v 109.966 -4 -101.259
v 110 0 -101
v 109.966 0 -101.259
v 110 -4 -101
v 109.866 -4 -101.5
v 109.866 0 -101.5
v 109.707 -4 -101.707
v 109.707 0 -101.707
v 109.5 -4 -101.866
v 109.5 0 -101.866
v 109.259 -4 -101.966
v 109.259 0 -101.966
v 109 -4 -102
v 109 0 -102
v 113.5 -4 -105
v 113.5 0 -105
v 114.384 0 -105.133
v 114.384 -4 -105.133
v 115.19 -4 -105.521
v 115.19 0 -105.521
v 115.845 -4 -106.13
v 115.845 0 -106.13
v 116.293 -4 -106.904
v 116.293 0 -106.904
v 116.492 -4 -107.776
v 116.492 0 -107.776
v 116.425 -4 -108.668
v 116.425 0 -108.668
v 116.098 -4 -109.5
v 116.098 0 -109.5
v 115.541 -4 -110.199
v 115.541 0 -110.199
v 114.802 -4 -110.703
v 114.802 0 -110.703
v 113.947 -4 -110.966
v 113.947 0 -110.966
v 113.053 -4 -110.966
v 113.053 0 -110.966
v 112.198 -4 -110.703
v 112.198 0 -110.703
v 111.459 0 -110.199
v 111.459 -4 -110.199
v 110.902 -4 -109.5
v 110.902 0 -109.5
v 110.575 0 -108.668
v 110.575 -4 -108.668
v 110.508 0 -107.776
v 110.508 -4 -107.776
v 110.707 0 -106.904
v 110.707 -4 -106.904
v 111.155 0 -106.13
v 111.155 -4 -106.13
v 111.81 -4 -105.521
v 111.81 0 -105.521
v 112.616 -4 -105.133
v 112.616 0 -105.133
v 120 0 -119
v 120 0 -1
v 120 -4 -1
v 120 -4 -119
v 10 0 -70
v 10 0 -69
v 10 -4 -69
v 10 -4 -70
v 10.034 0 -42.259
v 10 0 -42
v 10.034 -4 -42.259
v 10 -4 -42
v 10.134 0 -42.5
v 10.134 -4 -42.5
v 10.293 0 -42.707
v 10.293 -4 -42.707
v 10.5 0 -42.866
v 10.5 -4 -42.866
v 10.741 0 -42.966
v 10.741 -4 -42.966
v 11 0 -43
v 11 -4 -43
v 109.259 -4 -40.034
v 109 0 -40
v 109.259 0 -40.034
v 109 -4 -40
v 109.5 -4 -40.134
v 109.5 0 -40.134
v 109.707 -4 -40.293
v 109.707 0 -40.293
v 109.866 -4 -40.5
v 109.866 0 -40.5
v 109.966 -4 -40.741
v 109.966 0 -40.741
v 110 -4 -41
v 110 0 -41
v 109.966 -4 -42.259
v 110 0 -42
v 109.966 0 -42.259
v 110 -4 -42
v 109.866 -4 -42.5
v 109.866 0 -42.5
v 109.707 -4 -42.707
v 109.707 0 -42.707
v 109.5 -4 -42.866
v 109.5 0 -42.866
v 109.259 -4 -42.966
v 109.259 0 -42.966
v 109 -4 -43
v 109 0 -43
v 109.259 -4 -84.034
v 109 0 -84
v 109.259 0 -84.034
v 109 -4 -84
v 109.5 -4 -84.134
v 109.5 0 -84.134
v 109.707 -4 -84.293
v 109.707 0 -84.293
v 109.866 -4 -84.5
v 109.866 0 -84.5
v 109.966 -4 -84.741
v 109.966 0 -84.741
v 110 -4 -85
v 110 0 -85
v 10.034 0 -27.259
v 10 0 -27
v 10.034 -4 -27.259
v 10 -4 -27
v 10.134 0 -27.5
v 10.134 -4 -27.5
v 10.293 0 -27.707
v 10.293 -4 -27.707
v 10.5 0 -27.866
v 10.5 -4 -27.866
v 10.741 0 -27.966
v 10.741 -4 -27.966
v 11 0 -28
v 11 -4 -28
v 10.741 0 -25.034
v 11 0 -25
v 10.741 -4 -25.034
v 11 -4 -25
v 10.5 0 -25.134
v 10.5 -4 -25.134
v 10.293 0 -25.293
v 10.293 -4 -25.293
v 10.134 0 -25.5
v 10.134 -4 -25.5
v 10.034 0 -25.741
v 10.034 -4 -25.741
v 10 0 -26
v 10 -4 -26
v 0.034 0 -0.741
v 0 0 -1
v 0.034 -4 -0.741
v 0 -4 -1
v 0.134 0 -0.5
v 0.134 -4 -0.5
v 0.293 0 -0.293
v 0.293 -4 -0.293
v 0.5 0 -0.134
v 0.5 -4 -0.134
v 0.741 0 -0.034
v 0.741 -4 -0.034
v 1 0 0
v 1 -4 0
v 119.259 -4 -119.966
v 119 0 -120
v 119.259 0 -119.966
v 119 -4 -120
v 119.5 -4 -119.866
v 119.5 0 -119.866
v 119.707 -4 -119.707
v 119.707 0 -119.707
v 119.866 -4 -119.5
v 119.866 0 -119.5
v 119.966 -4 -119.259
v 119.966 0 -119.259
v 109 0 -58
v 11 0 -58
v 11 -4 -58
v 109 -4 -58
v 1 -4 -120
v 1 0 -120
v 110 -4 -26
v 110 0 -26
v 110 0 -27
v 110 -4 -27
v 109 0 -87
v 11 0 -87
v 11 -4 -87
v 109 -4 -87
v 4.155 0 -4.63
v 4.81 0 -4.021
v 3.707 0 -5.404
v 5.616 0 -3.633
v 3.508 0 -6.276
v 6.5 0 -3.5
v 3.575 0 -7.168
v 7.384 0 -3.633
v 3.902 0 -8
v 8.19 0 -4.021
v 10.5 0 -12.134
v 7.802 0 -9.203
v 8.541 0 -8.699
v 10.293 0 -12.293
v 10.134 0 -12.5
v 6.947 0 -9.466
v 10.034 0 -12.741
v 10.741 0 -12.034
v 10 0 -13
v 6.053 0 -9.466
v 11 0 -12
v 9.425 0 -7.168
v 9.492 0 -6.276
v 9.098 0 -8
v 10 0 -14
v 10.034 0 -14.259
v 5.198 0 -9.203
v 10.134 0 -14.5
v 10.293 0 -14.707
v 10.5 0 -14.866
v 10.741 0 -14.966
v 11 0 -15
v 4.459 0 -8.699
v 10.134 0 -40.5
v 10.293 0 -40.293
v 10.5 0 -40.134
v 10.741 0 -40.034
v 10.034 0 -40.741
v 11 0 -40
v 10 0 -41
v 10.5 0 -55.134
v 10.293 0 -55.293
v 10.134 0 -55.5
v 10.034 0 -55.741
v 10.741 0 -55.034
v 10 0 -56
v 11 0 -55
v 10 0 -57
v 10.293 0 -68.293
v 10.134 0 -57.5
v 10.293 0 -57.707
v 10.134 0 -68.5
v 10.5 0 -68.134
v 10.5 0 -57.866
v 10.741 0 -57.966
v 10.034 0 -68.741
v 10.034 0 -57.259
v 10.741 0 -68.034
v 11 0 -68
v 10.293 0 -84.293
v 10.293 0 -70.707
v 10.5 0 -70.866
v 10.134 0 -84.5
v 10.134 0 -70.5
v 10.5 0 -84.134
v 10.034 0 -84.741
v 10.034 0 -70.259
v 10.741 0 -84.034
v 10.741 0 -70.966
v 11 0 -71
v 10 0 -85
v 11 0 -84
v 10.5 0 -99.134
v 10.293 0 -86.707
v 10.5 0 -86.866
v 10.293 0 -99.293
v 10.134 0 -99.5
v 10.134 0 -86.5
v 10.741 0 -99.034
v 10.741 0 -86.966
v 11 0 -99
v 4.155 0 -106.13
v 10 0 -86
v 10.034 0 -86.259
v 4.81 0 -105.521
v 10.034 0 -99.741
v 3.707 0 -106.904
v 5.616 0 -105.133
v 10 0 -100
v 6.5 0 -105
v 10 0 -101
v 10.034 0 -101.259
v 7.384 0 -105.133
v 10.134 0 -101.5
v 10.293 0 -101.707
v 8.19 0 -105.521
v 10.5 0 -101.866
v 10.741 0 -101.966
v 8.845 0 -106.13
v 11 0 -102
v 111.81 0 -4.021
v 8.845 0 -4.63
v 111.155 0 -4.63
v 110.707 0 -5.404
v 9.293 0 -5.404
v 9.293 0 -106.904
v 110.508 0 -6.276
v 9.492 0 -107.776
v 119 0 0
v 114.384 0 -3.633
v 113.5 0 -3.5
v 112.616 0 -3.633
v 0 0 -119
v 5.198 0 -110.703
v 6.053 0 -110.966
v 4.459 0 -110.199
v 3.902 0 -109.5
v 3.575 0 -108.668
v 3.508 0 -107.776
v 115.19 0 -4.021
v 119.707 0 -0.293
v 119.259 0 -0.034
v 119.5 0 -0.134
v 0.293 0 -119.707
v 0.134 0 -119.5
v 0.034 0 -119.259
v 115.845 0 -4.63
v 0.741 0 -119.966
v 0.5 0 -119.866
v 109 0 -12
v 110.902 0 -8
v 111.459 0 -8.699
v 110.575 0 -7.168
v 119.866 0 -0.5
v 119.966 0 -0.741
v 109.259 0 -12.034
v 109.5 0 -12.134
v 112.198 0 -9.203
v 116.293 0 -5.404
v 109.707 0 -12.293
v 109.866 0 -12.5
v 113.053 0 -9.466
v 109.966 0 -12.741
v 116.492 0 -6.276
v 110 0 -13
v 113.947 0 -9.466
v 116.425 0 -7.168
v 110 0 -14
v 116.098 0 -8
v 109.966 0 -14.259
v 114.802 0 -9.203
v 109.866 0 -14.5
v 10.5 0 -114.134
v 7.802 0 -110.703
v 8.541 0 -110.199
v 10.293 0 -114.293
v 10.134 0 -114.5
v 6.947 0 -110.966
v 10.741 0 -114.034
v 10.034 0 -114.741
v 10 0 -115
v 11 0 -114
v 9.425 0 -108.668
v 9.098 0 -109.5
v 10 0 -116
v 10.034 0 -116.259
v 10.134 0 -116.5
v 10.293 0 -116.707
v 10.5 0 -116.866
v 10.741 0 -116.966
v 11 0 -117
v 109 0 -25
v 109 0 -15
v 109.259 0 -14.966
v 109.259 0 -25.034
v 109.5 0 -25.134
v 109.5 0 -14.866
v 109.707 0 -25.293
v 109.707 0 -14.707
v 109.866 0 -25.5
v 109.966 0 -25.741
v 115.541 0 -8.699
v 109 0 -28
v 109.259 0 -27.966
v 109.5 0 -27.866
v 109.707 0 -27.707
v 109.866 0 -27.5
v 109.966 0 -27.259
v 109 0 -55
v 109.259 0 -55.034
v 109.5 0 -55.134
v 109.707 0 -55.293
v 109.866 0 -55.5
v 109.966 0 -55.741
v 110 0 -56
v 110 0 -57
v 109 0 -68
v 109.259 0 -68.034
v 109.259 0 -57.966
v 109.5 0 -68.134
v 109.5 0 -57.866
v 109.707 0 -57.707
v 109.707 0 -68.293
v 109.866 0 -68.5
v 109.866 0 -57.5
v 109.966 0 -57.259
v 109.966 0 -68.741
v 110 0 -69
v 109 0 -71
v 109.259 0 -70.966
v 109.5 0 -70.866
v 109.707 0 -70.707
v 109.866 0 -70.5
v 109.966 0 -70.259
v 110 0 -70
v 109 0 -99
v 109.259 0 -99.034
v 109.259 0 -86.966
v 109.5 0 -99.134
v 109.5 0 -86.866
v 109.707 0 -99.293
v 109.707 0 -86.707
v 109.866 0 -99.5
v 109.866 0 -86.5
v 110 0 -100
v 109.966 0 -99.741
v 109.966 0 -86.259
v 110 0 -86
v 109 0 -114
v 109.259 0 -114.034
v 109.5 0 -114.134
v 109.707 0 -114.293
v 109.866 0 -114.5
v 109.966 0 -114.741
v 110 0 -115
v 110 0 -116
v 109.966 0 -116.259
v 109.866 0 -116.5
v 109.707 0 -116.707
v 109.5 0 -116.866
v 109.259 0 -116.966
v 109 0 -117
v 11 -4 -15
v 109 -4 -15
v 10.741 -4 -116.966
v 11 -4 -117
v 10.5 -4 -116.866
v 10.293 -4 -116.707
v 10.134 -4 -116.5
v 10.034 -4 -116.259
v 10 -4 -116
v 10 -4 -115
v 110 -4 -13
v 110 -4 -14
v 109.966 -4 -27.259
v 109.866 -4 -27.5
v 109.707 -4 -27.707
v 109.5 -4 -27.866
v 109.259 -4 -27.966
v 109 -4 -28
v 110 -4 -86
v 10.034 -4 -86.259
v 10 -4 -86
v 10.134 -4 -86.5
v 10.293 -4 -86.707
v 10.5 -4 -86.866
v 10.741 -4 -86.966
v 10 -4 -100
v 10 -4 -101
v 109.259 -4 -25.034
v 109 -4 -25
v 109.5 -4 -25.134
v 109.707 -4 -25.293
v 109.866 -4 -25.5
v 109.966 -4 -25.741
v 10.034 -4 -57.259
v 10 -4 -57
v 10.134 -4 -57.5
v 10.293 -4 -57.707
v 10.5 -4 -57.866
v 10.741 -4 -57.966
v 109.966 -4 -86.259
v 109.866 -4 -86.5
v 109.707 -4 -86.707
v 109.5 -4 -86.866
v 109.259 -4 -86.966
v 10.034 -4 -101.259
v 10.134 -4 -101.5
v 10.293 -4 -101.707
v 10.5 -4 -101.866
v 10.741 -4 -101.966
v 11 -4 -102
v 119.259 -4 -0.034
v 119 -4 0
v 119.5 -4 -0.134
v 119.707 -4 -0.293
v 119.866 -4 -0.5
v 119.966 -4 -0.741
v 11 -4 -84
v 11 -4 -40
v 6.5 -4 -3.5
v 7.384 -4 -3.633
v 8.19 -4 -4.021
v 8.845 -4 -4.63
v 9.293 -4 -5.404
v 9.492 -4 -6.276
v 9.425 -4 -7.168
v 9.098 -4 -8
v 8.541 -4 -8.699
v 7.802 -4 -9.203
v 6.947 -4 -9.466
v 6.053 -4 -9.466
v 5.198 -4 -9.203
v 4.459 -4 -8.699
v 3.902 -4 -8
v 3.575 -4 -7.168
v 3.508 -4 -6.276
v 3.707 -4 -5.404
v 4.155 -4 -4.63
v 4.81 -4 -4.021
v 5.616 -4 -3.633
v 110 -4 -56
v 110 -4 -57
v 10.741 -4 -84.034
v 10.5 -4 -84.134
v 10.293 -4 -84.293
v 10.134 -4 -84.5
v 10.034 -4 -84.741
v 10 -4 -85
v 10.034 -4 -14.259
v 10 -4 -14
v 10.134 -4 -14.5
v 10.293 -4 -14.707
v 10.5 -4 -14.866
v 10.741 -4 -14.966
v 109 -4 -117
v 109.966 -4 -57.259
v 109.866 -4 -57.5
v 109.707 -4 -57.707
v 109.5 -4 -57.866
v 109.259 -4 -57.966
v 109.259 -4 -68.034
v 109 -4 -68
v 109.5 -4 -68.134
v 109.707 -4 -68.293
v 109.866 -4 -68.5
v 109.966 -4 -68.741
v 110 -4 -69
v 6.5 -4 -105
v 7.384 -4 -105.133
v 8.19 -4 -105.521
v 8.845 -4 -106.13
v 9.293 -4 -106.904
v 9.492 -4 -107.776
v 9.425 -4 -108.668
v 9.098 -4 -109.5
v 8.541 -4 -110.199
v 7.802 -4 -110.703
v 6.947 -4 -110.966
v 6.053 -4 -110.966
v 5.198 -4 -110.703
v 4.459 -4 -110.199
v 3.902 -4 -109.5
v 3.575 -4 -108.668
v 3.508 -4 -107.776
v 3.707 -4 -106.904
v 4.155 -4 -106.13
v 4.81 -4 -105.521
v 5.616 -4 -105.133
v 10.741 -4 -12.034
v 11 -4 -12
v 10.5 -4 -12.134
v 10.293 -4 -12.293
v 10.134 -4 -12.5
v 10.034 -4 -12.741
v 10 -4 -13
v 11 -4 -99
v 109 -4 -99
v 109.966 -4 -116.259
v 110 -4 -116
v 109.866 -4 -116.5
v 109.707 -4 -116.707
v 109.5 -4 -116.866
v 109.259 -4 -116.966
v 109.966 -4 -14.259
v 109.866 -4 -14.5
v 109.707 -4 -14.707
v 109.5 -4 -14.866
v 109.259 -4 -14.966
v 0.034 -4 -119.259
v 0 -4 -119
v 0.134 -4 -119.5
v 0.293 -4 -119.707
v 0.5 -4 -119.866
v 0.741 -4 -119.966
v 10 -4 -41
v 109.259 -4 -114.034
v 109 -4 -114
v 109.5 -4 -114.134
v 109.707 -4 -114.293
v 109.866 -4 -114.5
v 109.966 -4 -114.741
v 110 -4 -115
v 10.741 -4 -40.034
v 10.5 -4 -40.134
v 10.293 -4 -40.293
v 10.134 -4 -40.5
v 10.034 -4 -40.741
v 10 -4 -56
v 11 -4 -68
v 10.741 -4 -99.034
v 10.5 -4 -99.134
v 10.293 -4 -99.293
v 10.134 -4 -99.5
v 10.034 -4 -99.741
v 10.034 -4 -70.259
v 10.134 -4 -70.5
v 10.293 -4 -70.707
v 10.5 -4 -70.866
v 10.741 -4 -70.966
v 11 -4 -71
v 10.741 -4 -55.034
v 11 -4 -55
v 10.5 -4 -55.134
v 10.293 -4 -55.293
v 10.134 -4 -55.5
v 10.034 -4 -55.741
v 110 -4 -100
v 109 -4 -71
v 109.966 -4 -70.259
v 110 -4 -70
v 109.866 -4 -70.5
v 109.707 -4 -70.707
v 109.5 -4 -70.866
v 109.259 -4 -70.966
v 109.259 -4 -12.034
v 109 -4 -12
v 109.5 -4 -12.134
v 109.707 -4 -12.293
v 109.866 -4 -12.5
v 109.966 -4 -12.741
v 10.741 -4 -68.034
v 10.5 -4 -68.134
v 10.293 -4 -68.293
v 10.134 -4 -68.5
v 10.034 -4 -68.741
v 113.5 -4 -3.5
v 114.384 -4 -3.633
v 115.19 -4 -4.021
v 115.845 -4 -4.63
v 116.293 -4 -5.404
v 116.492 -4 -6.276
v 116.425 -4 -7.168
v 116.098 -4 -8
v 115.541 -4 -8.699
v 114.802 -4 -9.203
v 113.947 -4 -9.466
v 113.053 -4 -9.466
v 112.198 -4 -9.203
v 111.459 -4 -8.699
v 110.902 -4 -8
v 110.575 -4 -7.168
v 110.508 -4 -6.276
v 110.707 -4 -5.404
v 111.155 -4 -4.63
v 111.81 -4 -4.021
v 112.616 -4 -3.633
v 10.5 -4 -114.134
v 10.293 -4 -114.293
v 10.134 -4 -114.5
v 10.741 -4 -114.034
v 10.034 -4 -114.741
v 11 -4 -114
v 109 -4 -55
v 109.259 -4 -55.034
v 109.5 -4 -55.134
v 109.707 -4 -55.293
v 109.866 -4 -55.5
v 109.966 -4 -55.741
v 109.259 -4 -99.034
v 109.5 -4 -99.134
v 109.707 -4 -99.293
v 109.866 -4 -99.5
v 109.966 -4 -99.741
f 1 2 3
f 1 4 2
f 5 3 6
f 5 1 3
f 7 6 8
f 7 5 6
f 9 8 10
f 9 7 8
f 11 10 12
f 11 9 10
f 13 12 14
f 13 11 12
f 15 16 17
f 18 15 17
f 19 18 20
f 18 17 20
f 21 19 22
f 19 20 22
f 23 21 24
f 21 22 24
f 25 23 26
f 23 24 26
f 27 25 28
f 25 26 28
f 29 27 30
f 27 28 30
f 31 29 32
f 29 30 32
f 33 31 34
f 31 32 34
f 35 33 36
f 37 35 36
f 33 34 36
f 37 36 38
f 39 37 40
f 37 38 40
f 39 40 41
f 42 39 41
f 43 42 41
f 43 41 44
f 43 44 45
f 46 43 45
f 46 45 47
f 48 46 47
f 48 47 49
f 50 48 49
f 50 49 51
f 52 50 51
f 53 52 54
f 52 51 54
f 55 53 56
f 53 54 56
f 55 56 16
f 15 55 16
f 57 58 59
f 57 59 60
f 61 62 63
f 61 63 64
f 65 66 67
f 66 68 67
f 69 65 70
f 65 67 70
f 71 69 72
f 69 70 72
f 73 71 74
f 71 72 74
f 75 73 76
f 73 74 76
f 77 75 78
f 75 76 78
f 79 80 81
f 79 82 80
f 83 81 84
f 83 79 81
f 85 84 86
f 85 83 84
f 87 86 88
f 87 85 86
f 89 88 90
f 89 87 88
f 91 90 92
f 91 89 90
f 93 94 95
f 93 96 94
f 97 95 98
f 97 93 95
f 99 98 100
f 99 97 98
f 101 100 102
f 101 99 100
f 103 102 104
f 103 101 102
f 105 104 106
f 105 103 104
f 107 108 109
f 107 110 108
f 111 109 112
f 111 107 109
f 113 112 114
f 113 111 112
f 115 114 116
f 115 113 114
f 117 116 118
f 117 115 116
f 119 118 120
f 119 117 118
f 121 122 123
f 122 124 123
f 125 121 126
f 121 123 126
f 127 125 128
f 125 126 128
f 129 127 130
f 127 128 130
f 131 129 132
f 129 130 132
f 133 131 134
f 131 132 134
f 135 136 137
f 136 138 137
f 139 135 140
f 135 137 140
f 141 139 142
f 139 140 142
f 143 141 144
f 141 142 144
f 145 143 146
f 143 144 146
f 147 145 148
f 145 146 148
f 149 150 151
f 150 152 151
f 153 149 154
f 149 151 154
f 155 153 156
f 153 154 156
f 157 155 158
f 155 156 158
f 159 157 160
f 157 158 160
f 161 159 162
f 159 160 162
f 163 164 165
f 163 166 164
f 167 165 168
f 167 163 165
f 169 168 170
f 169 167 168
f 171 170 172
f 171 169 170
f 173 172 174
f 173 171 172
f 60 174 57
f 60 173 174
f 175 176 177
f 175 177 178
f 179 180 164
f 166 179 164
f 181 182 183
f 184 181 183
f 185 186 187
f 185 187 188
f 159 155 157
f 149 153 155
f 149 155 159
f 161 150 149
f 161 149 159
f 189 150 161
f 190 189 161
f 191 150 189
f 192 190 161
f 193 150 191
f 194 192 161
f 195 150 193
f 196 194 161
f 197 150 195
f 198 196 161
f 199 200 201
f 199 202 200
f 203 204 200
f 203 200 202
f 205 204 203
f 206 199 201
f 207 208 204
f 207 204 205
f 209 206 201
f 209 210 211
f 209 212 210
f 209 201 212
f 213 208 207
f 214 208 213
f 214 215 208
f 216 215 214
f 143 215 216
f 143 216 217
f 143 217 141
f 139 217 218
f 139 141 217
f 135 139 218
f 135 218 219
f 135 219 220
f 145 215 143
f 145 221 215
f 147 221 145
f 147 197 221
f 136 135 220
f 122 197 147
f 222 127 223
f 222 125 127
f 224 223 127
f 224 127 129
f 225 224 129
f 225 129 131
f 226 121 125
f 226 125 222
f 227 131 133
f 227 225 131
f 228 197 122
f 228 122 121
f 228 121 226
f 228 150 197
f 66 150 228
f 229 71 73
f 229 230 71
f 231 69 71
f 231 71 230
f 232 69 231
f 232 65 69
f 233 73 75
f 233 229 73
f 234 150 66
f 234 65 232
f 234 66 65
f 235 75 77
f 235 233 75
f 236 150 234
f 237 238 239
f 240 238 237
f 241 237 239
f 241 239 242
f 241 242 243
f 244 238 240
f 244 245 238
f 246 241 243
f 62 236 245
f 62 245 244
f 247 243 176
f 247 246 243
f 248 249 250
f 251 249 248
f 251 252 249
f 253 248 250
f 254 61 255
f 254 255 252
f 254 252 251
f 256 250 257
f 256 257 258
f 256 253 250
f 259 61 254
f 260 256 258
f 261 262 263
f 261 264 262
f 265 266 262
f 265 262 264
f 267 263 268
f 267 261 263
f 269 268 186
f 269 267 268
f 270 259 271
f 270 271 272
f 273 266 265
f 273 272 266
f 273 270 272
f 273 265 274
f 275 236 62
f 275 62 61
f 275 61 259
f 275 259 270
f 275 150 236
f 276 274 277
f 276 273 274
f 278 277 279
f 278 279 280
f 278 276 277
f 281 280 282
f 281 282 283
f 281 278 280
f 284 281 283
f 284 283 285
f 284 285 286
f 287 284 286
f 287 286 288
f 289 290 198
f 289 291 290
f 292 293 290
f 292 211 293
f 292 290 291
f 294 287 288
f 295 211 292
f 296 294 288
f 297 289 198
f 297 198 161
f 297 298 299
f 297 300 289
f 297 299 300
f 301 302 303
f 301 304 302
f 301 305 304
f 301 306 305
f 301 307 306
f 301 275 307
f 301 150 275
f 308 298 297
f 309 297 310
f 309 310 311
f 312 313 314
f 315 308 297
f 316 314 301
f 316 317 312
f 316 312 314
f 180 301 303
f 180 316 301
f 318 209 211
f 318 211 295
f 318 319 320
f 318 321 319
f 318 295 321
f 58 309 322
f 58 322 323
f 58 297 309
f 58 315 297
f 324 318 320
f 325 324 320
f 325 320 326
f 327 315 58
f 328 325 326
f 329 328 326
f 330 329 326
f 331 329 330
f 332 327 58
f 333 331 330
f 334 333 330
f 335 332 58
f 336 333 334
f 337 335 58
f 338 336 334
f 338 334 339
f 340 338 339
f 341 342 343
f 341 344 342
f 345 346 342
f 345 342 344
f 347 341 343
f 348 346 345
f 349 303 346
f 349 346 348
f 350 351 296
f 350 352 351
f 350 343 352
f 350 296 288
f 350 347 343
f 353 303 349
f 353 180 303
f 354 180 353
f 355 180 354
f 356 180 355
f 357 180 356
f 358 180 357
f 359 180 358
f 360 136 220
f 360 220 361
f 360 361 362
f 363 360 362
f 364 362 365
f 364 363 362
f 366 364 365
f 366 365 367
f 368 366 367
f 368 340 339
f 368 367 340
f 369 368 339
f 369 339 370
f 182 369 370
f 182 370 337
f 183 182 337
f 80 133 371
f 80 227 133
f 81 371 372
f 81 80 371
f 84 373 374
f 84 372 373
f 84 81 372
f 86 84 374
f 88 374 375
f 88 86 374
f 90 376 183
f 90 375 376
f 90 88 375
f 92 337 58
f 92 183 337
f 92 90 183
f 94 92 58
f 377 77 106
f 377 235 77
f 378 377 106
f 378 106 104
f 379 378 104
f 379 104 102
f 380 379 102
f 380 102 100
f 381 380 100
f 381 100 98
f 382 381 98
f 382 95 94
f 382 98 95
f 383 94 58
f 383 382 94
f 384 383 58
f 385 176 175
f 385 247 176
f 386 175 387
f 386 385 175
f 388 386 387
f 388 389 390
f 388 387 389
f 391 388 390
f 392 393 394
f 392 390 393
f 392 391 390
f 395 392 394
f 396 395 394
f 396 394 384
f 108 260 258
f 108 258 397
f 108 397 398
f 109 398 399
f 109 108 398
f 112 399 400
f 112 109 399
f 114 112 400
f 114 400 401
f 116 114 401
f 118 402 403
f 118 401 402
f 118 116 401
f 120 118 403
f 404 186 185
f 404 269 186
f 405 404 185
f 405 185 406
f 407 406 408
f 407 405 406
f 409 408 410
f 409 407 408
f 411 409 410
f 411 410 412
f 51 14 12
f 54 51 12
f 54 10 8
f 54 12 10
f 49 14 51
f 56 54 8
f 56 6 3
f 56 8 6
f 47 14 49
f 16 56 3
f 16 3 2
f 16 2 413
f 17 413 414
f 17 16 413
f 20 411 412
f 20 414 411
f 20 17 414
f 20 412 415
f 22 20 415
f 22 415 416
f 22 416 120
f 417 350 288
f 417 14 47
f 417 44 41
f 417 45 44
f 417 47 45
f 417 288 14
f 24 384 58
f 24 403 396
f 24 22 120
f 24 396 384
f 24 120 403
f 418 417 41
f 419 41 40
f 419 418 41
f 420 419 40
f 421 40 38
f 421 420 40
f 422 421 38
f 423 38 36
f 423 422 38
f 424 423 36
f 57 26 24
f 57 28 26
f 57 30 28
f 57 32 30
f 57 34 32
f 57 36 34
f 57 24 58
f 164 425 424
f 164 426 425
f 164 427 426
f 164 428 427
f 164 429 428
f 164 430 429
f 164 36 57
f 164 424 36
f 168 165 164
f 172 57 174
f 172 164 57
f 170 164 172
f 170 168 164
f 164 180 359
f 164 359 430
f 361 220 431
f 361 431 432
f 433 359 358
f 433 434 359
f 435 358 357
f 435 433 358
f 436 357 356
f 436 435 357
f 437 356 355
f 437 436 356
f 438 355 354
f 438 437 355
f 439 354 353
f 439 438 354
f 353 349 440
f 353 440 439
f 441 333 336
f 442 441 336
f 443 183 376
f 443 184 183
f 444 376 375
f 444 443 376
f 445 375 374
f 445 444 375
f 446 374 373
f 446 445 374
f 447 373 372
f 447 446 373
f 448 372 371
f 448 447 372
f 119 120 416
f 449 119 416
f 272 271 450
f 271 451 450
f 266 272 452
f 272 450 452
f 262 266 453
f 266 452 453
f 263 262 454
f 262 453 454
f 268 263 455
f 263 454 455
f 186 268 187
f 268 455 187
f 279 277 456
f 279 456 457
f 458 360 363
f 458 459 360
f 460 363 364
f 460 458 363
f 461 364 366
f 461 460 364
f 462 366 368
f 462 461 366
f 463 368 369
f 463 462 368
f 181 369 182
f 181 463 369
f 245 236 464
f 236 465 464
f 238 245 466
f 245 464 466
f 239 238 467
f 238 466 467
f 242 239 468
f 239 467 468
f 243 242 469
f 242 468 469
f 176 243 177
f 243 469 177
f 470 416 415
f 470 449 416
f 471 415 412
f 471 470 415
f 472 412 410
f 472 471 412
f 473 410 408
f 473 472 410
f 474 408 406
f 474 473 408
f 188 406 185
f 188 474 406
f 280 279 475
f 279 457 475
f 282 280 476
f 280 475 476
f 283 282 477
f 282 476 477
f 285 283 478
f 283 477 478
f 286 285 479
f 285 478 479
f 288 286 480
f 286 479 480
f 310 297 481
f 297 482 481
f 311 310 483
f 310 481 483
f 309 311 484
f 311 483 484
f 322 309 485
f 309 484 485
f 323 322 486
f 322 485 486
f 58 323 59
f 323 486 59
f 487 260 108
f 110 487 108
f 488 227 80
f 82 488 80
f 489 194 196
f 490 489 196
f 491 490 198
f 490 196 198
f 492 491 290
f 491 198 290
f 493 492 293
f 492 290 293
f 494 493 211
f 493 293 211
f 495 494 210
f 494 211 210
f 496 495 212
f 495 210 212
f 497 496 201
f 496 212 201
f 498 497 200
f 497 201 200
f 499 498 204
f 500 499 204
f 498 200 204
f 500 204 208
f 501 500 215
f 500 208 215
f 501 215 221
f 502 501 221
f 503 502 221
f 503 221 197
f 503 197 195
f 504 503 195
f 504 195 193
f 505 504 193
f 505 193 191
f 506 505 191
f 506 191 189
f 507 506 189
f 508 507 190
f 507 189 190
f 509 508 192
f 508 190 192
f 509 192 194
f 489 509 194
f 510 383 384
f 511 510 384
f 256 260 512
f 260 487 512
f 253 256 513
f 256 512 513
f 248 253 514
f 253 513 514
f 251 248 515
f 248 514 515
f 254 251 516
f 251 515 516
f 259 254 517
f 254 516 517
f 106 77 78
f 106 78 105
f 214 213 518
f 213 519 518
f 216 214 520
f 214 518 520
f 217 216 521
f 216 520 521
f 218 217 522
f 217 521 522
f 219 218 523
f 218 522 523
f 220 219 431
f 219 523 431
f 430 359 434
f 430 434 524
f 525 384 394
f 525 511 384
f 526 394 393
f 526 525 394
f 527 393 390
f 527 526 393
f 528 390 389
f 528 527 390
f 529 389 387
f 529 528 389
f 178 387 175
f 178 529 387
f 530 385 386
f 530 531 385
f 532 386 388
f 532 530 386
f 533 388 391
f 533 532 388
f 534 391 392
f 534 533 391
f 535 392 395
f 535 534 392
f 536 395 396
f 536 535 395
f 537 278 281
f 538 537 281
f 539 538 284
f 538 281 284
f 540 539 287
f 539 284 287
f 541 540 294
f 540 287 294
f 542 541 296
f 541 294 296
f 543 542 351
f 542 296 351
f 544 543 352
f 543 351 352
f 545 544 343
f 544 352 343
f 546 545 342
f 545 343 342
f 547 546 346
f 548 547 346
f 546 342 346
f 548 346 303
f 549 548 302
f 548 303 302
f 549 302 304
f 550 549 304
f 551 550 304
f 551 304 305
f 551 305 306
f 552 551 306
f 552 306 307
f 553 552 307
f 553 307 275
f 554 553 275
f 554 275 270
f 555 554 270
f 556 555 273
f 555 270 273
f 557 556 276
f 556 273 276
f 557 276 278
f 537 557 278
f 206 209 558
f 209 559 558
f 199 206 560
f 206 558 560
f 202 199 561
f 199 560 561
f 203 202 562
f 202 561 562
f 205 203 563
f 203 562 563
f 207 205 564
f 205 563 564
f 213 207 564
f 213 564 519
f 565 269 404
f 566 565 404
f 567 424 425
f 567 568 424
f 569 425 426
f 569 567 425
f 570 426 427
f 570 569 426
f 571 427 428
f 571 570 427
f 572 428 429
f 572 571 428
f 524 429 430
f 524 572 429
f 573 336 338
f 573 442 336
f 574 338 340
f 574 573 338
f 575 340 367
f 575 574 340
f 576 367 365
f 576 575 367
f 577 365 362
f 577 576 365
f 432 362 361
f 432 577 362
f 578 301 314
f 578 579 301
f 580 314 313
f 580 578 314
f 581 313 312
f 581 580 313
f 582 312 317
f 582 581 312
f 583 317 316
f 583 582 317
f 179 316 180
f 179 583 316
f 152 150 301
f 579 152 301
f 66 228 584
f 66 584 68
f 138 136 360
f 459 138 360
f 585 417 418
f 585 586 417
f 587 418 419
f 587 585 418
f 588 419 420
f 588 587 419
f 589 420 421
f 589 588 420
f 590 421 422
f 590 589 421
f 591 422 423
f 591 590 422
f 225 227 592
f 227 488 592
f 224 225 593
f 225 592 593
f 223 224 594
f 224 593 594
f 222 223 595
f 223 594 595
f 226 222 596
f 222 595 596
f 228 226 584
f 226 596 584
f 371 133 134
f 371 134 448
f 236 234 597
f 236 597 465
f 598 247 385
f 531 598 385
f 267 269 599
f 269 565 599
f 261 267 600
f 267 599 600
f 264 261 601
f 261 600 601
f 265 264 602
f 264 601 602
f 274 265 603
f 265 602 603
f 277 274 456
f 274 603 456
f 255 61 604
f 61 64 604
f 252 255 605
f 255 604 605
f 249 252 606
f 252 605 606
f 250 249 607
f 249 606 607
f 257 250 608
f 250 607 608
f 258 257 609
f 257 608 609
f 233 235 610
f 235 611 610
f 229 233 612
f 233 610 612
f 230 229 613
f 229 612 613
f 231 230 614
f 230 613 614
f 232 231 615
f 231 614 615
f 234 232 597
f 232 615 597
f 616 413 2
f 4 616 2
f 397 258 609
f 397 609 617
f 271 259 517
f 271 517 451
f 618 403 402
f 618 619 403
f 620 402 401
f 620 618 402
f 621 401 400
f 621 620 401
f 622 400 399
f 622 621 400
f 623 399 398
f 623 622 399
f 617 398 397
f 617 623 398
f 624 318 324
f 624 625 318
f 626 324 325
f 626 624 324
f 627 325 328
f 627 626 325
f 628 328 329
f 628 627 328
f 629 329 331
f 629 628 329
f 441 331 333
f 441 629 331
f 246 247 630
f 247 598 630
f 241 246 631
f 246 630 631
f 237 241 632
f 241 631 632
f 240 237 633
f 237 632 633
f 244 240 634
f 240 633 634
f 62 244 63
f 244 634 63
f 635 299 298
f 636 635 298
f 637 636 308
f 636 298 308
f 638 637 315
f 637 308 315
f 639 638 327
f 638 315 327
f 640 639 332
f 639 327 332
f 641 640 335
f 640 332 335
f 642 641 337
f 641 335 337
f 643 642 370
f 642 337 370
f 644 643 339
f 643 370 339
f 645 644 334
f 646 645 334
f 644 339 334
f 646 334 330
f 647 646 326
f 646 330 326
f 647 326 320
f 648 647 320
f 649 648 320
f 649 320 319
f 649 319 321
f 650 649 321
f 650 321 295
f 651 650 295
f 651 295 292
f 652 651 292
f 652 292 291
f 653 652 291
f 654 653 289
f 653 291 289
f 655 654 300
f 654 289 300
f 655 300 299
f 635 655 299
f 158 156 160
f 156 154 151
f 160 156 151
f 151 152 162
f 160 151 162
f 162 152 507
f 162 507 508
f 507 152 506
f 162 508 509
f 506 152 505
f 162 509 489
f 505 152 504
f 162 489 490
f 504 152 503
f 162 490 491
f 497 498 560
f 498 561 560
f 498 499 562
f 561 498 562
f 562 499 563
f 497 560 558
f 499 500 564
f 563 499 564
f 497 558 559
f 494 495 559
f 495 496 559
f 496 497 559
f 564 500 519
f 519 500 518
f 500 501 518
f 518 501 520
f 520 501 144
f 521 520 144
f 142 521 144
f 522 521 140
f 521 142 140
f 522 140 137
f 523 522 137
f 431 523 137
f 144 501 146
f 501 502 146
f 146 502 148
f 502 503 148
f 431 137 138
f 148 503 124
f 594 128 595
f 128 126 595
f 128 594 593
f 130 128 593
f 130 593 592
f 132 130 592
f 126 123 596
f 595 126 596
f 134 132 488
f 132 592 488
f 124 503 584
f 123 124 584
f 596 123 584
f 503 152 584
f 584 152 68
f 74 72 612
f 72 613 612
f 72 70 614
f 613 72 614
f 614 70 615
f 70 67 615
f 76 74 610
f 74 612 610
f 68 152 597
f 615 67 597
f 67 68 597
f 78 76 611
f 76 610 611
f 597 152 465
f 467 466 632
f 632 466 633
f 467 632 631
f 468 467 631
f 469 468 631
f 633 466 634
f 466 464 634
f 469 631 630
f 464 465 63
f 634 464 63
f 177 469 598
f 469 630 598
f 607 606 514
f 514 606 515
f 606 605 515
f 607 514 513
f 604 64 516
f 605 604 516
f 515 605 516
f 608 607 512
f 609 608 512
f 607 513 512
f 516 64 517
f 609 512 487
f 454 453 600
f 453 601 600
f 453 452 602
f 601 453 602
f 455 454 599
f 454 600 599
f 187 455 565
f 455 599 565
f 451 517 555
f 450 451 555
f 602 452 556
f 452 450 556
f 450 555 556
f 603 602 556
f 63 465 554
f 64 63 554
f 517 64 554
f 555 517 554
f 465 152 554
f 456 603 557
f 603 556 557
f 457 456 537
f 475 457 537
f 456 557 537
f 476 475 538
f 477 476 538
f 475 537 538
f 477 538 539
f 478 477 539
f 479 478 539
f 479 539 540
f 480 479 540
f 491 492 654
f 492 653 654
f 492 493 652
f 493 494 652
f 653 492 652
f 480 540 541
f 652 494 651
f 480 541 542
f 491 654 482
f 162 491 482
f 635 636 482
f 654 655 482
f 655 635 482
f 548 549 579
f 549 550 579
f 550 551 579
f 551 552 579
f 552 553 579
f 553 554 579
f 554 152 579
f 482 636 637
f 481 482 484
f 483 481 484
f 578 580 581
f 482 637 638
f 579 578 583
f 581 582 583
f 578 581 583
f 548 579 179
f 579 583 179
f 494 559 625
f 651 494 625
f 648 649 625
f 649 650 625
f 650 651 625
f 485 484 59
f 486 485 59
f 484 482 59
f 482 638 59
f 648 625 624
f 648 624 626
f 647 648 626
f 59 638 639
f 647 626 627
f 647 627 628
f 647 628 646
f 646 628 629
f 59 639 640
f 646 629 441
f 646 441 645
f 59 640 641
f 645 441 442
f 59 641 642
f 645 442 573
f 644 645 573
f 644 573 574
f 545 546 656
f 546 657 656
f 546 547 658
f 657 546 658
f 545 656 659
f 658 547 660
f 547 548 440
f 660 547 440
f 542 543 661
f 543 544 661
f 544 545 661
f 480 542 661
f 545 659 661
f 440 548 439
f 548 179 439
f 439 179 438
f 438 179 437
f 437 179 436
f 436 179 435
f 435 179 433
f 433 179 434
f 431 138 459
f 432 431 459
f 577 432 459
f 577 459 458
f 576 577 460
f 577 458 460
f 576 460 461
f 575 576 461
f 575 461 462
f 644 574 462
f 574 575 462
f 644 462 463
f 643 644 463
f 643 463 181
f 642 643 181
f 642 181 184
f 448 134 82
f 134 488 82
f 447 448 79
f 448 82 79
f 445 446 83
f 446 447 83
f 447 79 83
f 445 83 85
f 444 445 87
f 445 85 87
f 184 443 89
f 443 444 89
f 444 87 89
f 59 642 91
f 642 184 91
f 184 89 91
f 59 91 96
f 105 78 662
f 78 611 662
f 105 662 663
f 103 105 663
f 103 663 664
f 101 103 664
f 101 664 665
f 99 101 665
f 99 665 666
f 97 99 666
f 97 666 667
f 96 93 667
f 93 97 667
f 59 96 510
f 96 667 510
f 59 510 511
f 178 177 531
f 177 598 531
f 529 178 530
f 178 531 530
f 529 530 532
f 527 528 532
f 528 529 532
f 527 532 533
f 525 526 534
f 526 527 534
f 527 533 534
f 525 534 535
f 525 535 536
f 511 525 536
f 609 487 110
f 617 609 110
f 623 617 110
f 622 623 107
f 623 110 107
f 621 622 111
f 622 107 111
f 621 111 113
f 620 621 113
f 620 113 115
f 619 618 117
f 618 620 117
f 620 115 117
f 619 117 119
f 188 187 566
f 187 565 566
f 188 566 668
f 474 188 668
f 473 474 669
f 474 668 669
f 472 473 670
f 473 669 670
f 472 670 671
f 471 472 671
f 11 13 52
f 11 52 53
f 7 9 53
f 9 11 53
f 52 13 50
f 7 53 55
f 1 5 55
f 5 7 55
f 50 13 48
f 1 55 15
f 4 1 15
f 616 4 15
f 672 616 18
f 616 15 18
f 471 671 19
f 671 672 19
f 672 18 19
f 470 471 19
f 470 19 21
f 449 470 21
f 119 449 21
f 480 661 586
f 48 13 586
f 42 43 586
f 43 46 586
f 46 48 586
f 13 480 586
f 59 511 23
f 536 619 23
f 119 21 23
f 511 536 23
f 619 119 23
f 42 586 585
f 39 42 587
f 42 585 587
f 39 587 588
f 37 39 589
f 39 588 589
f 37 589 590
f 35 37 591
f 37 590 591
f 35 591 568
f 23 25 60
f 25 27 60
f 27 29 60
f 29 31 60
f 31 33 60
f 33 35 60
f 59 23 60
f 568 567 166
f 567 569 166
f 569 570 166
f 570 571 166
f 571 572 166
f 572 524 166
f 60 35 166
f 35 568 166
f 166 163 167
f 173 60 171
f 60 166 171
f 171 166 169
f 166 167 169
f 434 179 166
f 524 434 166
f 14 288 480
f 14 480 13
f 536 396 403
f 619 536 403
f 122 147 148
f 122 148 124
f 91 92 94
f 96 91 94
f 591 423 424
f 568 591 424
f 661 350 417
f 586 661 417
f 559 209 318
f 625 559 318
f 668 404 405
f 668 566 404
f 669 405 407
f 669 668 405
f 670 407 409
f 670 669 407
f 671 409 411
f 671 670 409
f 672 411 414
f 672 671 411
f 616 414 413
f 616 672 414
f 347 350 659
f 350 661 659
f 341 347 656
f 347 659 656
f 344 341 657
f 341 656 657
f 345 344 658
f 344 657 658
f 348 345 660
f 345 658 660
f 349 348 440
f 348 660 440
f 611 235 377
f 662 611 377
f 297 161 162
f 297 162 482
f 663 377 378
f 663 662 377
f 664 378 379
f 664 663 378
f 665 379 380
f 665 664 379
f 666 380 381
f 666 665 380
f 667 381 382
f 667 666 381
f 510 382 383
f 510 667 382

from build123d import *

# Parameters (mm, degrees)
SKETCH1_W           = 120
SKETCH1_H           = 120
SKETCH1_R           = 3
SKETCH1_W_2         = 100
SKETCH1_H_2         = 3
BOSS_EXTRUDE1_DEPTH = 4
FILLET1_R           = 1
FILLET2_R           = 1


with BuildPart() as part:
    # Sketch1 → Boss-Extrude1 (new body)
    with BuildSketch(Plane(origin=(0, 0, 0), x_dir=(1, 0, 0), z_dir=(0, 1, 0))):
        with Locations((60, 60)):
            Rectangle(SKETCH1_W, SKETCH1_H)
        with Locations(Location((113.5, 6.5, 0), (0, 0, 270))):
            Circle(SKETCH1_R, mode=Mode.SUBTRACT)
        with Locations(Location((6.5, 6.5, 0), (0, 0, 270))):
            Circle(SKETCH1_R, mode=Mode.SUBTRACT)
        with Locations(Location((113.5, 108, 0), (0, 0, 270))):
            Circle(SKETCH1_R, mode=Mode.SUBTRACT)
        with Locations(Location((6.5, 108, 0), (0, 0, 270))):
            Circle(SKETCH1_R, mode=Mode.SUBTRACT)
        with Locations((60, 13.5)):
            Rectangle(SKETCH1_W_2, SKETCH1_H_2, mode=Mode.SUBTRACT)
        with Locations((60, 69.5)):
            Rectangle(SKETCH1_W_2, SKETCH1_H_2, mode=Mode.SUBTRACT)
        with Locations((60, 26.5)):
            Rectangle(SKETCH1_W_2, SKETCH1_H_2, mode=Mode.SUBTRACT)
        with Locations((60, 41.5)):
            Rectangle(SKETCH1_W_2, SKETCH1_H_2, mode=Mode.SUBTRACT)
        with Locations((60, 56.5)):
            Rectangle(SKETCH1_W_2, SKETCH1_H_2, mode=Mode.SUBTRACT)
        with Locations((60, 85.5)):
            Rectangle(SKETCH1_W_2, SKETCH1_H_2, mode=Mode.SUBTRACT)
        with Locations((60, 100.5)):
            Rectangle(SKETCH1_W_2, SKETCH1_H_2, mode=Mode.SUBTRACT)
        with Locations((60, 115.5)):
            Rectangle(SKETCH1_W_2, SKETCH1_H_2, mode=Mode.SUBTRACT)
    extrude(amount=-BOSS_EXTRUDE1_DEPTH)

    # Fillet1
    fillet1_edges = [part.edges().sort_by_distance(p)[0] for p in [
        (110, -2, -15),
        (10, -2, -15),
        (10, -2, -12),
        (110, -2, -12),
        (110, -2, -28),
        (10, -2, -28),
        (10, -2, -25),
        (110, -2, -25),
        (110, -2, -43),
        (10, -2, -43),
        (10, -2, -40),
        (110, -2, -40),
        (110, -2, -58),
        (10, -2, -58),
        (10, -2, -55),
        (110, -2, -55),
        (110, -2, -71),
        (10, -2, -71),
        (10, -2, -68),
        (110, -2, -68),
        (110, -2, -87),
        (10, -2, -87),
        (10, -2, -84),
        (110, -2, -84),
        (110, -2, -102),
        (10, -2, -102),
        (10, -2, -99),
        (110, -2, -99),
        (110, -2, -117),
        (10, -2, -117),
        (10, -2, -114),
        (110, -2, -114),
    ]]
    fillet(fillet1_edges, radius=FILLET1_R)

    # Fillet2
    fillet2_edges = [part.edges().sort_by_distance(p)[0] for p in [
        (0, -2, 0),
        (0, -2, -120),
        (120, -2, -120),
        (120, -2, 0),
    ]]
    fillet(fillet2_edges, radius=FILLET2_R)


solid = part.part
